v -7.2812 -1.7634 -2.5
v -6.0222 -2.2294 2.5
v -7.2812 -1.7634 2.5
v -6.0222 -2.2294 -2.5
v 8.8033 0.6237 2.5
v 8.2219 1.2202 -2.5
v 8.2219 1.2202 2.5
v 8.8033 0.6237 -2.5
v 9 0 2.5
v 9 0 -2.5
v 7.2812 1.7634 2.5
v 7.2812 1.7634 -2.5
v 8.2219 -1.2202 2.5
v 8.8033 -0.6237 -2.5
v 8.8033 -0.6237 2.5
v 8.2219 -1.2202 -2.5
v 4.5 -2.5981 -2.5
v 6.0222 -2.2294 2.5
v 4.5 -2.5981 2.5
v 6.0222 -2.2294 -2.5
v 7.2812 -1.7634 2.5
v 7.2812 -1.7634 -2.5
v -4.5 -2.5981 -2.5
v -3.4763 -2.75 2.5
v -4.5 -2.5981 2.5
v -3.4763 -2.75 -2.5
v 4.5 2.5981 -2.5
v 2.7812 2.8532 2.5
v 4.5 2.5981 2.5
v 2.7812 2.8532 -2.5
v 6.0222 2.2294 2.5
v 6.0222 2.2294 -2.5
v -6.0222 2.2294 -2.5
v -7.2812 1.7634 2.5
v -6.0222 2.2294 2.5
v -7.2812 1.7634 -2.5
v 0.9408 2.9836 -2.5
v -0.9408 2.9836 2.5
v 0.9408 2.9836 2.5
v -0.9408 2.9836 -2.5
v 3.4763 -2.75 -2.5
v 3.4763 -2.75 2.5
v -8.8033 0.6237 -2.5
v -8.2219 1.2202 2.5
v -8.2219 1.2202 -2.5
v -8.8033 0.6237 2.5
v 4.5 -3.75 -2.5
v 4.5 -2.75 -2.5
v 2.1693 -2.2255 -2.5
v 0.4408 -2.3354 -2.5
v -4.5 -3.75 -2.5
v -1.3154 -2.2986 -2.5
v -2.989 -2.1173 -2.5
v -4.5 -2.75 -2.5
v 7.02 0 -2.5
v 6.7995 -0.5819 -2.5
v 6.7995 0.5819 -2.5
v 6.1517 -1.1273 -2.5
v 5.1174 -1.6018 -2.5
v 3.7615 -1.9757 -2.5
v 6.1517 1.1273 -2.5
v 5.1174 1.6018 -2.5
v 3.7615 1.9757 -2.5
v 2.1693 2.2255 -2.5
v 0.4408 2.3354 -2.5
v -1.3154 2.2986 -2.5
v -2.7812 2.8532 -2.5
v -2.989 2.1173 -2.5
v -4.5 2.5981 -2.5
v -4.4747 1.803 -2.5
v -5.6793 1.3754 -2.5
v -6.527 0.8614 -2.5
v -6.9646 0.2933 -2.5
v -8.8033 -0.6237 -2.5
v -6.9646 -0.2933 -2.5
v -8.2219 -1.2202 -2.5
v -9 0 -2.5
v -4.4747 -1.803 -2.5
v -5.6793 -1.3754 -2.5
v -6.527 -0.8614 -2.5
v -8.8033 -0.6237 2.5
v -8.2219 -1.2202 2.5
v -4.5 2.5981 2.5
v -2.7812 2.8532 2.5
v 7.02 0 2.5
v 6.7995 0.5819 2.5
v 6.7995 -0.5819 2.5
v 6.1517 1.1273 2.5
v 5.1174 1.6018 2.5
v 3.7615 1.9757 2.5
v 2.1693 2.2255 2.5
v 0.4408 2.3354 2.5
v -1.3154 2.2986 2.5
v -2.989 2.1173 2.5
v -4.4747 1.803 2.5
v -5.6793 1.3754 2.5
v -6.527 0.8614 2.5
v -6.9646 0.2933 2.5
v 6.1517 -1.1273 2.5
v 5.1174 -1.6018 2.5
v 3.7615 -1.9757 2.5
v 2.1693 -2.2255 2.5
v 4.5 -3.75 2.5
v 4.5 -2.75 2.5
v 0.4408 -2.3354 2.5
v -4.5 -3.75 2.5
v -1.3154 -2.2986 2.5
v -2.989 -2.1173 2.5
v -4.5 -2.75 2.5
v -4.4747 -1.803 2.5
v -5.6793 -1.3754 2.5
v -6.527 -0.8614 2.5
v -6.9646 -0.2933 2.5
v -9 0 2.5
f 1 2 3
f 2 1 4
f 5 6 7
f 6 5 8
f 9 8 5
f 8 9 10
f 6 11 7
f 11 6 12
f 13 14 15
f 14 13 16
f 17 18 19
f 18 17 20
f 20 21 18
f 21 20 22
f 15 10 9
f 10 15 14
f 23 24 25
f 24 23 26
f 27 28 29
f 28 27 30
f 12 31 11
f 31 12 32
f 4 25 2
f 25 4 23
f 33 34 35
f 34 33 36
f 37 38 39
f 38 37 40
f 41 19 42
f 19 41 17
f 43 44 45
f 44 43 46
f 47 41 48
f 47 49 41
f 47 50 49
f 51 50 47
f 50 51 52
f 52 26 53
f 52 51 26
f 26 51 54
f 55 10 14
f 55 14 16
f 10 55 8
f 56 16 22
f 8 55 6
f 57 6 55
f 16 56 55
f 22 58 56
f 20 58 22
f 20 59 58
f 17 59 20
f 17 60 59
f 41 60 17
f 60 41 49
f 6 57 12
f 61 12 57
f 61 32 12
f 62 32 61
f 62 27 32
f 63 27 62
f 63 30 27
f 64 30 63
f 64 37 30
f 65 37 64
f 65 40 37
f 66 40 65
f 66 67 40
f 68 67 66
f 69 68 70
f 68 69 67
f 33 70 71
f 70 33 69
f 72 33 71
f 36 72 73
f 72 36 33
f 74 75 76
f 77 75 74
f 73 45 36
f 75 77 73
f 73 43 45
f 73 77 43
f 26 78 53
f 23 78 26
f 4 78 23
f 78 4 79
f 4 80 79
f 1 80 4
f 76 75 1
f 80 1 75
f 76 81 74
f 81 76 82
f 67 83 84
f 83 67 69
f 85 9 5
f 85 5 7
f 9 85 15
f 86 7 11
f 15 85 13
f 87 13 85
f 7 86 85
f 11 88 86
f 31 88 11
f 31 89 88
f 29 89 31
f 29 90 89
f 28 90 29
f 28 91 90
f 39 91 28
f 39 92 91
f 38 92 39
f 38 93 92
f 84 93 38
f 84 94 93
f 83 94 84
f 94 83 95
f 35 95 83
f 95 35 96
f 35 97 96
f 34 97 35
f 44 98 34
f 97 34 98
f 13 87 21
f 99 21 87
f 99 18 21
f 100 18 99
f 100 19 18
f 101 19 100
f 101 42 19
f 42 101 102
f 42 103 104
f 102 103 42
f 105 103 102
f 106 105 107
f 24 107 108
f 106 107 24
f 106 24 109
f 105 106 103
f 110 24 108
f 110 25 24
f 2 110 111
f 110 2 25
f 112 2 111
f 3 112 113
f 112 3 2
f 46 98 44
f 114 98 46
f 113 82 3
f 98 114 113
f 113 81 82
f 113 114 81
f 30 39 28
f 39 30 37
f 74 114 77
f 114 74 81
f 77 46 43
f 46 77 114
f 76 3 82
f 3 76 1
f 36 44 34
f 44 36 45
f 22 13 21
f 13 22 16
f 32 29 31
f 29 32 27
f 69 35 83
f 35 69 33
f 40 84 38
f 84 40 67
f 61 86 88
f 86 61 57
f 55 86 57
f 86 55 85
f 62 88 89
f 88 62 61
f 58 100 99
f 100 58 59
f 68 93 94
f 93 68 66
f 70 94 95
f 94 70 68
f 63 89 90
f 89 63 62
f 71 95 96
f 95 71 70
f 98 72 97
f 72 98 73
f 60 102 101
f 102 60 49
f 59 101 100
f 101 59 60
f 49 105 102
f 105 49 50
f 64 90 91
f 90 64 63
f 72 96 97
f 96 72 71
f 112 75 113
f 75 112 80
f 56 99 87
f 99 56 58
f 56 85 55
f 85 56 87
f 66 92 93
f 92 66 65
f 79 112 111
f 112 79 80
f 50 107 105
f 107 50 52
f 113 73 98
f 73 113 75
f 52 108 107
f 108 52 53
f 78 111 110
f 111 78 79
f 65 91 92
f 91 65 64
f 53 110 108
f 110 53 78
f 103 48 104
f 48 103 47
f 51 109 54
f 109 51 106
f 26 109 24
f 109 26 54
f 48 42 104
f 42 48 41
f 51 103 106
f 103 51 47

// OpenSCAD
difference() {
    union() {
        springLeaf(5, 9, 3);
        translate([0,-3.25,0]) cube([9,1,5], center=true);
        //translate([0,3.25,0]) cube([9,1,5], center=true);
    }
}

module springLeaf(width=3,len=10,height=5){
 scale([len/10,height/10,1]) difference() {
     cylinder(h=width, r=10, center=true);
     #cylinder(h=width+2, r=7.8, center=true);
  }
}
